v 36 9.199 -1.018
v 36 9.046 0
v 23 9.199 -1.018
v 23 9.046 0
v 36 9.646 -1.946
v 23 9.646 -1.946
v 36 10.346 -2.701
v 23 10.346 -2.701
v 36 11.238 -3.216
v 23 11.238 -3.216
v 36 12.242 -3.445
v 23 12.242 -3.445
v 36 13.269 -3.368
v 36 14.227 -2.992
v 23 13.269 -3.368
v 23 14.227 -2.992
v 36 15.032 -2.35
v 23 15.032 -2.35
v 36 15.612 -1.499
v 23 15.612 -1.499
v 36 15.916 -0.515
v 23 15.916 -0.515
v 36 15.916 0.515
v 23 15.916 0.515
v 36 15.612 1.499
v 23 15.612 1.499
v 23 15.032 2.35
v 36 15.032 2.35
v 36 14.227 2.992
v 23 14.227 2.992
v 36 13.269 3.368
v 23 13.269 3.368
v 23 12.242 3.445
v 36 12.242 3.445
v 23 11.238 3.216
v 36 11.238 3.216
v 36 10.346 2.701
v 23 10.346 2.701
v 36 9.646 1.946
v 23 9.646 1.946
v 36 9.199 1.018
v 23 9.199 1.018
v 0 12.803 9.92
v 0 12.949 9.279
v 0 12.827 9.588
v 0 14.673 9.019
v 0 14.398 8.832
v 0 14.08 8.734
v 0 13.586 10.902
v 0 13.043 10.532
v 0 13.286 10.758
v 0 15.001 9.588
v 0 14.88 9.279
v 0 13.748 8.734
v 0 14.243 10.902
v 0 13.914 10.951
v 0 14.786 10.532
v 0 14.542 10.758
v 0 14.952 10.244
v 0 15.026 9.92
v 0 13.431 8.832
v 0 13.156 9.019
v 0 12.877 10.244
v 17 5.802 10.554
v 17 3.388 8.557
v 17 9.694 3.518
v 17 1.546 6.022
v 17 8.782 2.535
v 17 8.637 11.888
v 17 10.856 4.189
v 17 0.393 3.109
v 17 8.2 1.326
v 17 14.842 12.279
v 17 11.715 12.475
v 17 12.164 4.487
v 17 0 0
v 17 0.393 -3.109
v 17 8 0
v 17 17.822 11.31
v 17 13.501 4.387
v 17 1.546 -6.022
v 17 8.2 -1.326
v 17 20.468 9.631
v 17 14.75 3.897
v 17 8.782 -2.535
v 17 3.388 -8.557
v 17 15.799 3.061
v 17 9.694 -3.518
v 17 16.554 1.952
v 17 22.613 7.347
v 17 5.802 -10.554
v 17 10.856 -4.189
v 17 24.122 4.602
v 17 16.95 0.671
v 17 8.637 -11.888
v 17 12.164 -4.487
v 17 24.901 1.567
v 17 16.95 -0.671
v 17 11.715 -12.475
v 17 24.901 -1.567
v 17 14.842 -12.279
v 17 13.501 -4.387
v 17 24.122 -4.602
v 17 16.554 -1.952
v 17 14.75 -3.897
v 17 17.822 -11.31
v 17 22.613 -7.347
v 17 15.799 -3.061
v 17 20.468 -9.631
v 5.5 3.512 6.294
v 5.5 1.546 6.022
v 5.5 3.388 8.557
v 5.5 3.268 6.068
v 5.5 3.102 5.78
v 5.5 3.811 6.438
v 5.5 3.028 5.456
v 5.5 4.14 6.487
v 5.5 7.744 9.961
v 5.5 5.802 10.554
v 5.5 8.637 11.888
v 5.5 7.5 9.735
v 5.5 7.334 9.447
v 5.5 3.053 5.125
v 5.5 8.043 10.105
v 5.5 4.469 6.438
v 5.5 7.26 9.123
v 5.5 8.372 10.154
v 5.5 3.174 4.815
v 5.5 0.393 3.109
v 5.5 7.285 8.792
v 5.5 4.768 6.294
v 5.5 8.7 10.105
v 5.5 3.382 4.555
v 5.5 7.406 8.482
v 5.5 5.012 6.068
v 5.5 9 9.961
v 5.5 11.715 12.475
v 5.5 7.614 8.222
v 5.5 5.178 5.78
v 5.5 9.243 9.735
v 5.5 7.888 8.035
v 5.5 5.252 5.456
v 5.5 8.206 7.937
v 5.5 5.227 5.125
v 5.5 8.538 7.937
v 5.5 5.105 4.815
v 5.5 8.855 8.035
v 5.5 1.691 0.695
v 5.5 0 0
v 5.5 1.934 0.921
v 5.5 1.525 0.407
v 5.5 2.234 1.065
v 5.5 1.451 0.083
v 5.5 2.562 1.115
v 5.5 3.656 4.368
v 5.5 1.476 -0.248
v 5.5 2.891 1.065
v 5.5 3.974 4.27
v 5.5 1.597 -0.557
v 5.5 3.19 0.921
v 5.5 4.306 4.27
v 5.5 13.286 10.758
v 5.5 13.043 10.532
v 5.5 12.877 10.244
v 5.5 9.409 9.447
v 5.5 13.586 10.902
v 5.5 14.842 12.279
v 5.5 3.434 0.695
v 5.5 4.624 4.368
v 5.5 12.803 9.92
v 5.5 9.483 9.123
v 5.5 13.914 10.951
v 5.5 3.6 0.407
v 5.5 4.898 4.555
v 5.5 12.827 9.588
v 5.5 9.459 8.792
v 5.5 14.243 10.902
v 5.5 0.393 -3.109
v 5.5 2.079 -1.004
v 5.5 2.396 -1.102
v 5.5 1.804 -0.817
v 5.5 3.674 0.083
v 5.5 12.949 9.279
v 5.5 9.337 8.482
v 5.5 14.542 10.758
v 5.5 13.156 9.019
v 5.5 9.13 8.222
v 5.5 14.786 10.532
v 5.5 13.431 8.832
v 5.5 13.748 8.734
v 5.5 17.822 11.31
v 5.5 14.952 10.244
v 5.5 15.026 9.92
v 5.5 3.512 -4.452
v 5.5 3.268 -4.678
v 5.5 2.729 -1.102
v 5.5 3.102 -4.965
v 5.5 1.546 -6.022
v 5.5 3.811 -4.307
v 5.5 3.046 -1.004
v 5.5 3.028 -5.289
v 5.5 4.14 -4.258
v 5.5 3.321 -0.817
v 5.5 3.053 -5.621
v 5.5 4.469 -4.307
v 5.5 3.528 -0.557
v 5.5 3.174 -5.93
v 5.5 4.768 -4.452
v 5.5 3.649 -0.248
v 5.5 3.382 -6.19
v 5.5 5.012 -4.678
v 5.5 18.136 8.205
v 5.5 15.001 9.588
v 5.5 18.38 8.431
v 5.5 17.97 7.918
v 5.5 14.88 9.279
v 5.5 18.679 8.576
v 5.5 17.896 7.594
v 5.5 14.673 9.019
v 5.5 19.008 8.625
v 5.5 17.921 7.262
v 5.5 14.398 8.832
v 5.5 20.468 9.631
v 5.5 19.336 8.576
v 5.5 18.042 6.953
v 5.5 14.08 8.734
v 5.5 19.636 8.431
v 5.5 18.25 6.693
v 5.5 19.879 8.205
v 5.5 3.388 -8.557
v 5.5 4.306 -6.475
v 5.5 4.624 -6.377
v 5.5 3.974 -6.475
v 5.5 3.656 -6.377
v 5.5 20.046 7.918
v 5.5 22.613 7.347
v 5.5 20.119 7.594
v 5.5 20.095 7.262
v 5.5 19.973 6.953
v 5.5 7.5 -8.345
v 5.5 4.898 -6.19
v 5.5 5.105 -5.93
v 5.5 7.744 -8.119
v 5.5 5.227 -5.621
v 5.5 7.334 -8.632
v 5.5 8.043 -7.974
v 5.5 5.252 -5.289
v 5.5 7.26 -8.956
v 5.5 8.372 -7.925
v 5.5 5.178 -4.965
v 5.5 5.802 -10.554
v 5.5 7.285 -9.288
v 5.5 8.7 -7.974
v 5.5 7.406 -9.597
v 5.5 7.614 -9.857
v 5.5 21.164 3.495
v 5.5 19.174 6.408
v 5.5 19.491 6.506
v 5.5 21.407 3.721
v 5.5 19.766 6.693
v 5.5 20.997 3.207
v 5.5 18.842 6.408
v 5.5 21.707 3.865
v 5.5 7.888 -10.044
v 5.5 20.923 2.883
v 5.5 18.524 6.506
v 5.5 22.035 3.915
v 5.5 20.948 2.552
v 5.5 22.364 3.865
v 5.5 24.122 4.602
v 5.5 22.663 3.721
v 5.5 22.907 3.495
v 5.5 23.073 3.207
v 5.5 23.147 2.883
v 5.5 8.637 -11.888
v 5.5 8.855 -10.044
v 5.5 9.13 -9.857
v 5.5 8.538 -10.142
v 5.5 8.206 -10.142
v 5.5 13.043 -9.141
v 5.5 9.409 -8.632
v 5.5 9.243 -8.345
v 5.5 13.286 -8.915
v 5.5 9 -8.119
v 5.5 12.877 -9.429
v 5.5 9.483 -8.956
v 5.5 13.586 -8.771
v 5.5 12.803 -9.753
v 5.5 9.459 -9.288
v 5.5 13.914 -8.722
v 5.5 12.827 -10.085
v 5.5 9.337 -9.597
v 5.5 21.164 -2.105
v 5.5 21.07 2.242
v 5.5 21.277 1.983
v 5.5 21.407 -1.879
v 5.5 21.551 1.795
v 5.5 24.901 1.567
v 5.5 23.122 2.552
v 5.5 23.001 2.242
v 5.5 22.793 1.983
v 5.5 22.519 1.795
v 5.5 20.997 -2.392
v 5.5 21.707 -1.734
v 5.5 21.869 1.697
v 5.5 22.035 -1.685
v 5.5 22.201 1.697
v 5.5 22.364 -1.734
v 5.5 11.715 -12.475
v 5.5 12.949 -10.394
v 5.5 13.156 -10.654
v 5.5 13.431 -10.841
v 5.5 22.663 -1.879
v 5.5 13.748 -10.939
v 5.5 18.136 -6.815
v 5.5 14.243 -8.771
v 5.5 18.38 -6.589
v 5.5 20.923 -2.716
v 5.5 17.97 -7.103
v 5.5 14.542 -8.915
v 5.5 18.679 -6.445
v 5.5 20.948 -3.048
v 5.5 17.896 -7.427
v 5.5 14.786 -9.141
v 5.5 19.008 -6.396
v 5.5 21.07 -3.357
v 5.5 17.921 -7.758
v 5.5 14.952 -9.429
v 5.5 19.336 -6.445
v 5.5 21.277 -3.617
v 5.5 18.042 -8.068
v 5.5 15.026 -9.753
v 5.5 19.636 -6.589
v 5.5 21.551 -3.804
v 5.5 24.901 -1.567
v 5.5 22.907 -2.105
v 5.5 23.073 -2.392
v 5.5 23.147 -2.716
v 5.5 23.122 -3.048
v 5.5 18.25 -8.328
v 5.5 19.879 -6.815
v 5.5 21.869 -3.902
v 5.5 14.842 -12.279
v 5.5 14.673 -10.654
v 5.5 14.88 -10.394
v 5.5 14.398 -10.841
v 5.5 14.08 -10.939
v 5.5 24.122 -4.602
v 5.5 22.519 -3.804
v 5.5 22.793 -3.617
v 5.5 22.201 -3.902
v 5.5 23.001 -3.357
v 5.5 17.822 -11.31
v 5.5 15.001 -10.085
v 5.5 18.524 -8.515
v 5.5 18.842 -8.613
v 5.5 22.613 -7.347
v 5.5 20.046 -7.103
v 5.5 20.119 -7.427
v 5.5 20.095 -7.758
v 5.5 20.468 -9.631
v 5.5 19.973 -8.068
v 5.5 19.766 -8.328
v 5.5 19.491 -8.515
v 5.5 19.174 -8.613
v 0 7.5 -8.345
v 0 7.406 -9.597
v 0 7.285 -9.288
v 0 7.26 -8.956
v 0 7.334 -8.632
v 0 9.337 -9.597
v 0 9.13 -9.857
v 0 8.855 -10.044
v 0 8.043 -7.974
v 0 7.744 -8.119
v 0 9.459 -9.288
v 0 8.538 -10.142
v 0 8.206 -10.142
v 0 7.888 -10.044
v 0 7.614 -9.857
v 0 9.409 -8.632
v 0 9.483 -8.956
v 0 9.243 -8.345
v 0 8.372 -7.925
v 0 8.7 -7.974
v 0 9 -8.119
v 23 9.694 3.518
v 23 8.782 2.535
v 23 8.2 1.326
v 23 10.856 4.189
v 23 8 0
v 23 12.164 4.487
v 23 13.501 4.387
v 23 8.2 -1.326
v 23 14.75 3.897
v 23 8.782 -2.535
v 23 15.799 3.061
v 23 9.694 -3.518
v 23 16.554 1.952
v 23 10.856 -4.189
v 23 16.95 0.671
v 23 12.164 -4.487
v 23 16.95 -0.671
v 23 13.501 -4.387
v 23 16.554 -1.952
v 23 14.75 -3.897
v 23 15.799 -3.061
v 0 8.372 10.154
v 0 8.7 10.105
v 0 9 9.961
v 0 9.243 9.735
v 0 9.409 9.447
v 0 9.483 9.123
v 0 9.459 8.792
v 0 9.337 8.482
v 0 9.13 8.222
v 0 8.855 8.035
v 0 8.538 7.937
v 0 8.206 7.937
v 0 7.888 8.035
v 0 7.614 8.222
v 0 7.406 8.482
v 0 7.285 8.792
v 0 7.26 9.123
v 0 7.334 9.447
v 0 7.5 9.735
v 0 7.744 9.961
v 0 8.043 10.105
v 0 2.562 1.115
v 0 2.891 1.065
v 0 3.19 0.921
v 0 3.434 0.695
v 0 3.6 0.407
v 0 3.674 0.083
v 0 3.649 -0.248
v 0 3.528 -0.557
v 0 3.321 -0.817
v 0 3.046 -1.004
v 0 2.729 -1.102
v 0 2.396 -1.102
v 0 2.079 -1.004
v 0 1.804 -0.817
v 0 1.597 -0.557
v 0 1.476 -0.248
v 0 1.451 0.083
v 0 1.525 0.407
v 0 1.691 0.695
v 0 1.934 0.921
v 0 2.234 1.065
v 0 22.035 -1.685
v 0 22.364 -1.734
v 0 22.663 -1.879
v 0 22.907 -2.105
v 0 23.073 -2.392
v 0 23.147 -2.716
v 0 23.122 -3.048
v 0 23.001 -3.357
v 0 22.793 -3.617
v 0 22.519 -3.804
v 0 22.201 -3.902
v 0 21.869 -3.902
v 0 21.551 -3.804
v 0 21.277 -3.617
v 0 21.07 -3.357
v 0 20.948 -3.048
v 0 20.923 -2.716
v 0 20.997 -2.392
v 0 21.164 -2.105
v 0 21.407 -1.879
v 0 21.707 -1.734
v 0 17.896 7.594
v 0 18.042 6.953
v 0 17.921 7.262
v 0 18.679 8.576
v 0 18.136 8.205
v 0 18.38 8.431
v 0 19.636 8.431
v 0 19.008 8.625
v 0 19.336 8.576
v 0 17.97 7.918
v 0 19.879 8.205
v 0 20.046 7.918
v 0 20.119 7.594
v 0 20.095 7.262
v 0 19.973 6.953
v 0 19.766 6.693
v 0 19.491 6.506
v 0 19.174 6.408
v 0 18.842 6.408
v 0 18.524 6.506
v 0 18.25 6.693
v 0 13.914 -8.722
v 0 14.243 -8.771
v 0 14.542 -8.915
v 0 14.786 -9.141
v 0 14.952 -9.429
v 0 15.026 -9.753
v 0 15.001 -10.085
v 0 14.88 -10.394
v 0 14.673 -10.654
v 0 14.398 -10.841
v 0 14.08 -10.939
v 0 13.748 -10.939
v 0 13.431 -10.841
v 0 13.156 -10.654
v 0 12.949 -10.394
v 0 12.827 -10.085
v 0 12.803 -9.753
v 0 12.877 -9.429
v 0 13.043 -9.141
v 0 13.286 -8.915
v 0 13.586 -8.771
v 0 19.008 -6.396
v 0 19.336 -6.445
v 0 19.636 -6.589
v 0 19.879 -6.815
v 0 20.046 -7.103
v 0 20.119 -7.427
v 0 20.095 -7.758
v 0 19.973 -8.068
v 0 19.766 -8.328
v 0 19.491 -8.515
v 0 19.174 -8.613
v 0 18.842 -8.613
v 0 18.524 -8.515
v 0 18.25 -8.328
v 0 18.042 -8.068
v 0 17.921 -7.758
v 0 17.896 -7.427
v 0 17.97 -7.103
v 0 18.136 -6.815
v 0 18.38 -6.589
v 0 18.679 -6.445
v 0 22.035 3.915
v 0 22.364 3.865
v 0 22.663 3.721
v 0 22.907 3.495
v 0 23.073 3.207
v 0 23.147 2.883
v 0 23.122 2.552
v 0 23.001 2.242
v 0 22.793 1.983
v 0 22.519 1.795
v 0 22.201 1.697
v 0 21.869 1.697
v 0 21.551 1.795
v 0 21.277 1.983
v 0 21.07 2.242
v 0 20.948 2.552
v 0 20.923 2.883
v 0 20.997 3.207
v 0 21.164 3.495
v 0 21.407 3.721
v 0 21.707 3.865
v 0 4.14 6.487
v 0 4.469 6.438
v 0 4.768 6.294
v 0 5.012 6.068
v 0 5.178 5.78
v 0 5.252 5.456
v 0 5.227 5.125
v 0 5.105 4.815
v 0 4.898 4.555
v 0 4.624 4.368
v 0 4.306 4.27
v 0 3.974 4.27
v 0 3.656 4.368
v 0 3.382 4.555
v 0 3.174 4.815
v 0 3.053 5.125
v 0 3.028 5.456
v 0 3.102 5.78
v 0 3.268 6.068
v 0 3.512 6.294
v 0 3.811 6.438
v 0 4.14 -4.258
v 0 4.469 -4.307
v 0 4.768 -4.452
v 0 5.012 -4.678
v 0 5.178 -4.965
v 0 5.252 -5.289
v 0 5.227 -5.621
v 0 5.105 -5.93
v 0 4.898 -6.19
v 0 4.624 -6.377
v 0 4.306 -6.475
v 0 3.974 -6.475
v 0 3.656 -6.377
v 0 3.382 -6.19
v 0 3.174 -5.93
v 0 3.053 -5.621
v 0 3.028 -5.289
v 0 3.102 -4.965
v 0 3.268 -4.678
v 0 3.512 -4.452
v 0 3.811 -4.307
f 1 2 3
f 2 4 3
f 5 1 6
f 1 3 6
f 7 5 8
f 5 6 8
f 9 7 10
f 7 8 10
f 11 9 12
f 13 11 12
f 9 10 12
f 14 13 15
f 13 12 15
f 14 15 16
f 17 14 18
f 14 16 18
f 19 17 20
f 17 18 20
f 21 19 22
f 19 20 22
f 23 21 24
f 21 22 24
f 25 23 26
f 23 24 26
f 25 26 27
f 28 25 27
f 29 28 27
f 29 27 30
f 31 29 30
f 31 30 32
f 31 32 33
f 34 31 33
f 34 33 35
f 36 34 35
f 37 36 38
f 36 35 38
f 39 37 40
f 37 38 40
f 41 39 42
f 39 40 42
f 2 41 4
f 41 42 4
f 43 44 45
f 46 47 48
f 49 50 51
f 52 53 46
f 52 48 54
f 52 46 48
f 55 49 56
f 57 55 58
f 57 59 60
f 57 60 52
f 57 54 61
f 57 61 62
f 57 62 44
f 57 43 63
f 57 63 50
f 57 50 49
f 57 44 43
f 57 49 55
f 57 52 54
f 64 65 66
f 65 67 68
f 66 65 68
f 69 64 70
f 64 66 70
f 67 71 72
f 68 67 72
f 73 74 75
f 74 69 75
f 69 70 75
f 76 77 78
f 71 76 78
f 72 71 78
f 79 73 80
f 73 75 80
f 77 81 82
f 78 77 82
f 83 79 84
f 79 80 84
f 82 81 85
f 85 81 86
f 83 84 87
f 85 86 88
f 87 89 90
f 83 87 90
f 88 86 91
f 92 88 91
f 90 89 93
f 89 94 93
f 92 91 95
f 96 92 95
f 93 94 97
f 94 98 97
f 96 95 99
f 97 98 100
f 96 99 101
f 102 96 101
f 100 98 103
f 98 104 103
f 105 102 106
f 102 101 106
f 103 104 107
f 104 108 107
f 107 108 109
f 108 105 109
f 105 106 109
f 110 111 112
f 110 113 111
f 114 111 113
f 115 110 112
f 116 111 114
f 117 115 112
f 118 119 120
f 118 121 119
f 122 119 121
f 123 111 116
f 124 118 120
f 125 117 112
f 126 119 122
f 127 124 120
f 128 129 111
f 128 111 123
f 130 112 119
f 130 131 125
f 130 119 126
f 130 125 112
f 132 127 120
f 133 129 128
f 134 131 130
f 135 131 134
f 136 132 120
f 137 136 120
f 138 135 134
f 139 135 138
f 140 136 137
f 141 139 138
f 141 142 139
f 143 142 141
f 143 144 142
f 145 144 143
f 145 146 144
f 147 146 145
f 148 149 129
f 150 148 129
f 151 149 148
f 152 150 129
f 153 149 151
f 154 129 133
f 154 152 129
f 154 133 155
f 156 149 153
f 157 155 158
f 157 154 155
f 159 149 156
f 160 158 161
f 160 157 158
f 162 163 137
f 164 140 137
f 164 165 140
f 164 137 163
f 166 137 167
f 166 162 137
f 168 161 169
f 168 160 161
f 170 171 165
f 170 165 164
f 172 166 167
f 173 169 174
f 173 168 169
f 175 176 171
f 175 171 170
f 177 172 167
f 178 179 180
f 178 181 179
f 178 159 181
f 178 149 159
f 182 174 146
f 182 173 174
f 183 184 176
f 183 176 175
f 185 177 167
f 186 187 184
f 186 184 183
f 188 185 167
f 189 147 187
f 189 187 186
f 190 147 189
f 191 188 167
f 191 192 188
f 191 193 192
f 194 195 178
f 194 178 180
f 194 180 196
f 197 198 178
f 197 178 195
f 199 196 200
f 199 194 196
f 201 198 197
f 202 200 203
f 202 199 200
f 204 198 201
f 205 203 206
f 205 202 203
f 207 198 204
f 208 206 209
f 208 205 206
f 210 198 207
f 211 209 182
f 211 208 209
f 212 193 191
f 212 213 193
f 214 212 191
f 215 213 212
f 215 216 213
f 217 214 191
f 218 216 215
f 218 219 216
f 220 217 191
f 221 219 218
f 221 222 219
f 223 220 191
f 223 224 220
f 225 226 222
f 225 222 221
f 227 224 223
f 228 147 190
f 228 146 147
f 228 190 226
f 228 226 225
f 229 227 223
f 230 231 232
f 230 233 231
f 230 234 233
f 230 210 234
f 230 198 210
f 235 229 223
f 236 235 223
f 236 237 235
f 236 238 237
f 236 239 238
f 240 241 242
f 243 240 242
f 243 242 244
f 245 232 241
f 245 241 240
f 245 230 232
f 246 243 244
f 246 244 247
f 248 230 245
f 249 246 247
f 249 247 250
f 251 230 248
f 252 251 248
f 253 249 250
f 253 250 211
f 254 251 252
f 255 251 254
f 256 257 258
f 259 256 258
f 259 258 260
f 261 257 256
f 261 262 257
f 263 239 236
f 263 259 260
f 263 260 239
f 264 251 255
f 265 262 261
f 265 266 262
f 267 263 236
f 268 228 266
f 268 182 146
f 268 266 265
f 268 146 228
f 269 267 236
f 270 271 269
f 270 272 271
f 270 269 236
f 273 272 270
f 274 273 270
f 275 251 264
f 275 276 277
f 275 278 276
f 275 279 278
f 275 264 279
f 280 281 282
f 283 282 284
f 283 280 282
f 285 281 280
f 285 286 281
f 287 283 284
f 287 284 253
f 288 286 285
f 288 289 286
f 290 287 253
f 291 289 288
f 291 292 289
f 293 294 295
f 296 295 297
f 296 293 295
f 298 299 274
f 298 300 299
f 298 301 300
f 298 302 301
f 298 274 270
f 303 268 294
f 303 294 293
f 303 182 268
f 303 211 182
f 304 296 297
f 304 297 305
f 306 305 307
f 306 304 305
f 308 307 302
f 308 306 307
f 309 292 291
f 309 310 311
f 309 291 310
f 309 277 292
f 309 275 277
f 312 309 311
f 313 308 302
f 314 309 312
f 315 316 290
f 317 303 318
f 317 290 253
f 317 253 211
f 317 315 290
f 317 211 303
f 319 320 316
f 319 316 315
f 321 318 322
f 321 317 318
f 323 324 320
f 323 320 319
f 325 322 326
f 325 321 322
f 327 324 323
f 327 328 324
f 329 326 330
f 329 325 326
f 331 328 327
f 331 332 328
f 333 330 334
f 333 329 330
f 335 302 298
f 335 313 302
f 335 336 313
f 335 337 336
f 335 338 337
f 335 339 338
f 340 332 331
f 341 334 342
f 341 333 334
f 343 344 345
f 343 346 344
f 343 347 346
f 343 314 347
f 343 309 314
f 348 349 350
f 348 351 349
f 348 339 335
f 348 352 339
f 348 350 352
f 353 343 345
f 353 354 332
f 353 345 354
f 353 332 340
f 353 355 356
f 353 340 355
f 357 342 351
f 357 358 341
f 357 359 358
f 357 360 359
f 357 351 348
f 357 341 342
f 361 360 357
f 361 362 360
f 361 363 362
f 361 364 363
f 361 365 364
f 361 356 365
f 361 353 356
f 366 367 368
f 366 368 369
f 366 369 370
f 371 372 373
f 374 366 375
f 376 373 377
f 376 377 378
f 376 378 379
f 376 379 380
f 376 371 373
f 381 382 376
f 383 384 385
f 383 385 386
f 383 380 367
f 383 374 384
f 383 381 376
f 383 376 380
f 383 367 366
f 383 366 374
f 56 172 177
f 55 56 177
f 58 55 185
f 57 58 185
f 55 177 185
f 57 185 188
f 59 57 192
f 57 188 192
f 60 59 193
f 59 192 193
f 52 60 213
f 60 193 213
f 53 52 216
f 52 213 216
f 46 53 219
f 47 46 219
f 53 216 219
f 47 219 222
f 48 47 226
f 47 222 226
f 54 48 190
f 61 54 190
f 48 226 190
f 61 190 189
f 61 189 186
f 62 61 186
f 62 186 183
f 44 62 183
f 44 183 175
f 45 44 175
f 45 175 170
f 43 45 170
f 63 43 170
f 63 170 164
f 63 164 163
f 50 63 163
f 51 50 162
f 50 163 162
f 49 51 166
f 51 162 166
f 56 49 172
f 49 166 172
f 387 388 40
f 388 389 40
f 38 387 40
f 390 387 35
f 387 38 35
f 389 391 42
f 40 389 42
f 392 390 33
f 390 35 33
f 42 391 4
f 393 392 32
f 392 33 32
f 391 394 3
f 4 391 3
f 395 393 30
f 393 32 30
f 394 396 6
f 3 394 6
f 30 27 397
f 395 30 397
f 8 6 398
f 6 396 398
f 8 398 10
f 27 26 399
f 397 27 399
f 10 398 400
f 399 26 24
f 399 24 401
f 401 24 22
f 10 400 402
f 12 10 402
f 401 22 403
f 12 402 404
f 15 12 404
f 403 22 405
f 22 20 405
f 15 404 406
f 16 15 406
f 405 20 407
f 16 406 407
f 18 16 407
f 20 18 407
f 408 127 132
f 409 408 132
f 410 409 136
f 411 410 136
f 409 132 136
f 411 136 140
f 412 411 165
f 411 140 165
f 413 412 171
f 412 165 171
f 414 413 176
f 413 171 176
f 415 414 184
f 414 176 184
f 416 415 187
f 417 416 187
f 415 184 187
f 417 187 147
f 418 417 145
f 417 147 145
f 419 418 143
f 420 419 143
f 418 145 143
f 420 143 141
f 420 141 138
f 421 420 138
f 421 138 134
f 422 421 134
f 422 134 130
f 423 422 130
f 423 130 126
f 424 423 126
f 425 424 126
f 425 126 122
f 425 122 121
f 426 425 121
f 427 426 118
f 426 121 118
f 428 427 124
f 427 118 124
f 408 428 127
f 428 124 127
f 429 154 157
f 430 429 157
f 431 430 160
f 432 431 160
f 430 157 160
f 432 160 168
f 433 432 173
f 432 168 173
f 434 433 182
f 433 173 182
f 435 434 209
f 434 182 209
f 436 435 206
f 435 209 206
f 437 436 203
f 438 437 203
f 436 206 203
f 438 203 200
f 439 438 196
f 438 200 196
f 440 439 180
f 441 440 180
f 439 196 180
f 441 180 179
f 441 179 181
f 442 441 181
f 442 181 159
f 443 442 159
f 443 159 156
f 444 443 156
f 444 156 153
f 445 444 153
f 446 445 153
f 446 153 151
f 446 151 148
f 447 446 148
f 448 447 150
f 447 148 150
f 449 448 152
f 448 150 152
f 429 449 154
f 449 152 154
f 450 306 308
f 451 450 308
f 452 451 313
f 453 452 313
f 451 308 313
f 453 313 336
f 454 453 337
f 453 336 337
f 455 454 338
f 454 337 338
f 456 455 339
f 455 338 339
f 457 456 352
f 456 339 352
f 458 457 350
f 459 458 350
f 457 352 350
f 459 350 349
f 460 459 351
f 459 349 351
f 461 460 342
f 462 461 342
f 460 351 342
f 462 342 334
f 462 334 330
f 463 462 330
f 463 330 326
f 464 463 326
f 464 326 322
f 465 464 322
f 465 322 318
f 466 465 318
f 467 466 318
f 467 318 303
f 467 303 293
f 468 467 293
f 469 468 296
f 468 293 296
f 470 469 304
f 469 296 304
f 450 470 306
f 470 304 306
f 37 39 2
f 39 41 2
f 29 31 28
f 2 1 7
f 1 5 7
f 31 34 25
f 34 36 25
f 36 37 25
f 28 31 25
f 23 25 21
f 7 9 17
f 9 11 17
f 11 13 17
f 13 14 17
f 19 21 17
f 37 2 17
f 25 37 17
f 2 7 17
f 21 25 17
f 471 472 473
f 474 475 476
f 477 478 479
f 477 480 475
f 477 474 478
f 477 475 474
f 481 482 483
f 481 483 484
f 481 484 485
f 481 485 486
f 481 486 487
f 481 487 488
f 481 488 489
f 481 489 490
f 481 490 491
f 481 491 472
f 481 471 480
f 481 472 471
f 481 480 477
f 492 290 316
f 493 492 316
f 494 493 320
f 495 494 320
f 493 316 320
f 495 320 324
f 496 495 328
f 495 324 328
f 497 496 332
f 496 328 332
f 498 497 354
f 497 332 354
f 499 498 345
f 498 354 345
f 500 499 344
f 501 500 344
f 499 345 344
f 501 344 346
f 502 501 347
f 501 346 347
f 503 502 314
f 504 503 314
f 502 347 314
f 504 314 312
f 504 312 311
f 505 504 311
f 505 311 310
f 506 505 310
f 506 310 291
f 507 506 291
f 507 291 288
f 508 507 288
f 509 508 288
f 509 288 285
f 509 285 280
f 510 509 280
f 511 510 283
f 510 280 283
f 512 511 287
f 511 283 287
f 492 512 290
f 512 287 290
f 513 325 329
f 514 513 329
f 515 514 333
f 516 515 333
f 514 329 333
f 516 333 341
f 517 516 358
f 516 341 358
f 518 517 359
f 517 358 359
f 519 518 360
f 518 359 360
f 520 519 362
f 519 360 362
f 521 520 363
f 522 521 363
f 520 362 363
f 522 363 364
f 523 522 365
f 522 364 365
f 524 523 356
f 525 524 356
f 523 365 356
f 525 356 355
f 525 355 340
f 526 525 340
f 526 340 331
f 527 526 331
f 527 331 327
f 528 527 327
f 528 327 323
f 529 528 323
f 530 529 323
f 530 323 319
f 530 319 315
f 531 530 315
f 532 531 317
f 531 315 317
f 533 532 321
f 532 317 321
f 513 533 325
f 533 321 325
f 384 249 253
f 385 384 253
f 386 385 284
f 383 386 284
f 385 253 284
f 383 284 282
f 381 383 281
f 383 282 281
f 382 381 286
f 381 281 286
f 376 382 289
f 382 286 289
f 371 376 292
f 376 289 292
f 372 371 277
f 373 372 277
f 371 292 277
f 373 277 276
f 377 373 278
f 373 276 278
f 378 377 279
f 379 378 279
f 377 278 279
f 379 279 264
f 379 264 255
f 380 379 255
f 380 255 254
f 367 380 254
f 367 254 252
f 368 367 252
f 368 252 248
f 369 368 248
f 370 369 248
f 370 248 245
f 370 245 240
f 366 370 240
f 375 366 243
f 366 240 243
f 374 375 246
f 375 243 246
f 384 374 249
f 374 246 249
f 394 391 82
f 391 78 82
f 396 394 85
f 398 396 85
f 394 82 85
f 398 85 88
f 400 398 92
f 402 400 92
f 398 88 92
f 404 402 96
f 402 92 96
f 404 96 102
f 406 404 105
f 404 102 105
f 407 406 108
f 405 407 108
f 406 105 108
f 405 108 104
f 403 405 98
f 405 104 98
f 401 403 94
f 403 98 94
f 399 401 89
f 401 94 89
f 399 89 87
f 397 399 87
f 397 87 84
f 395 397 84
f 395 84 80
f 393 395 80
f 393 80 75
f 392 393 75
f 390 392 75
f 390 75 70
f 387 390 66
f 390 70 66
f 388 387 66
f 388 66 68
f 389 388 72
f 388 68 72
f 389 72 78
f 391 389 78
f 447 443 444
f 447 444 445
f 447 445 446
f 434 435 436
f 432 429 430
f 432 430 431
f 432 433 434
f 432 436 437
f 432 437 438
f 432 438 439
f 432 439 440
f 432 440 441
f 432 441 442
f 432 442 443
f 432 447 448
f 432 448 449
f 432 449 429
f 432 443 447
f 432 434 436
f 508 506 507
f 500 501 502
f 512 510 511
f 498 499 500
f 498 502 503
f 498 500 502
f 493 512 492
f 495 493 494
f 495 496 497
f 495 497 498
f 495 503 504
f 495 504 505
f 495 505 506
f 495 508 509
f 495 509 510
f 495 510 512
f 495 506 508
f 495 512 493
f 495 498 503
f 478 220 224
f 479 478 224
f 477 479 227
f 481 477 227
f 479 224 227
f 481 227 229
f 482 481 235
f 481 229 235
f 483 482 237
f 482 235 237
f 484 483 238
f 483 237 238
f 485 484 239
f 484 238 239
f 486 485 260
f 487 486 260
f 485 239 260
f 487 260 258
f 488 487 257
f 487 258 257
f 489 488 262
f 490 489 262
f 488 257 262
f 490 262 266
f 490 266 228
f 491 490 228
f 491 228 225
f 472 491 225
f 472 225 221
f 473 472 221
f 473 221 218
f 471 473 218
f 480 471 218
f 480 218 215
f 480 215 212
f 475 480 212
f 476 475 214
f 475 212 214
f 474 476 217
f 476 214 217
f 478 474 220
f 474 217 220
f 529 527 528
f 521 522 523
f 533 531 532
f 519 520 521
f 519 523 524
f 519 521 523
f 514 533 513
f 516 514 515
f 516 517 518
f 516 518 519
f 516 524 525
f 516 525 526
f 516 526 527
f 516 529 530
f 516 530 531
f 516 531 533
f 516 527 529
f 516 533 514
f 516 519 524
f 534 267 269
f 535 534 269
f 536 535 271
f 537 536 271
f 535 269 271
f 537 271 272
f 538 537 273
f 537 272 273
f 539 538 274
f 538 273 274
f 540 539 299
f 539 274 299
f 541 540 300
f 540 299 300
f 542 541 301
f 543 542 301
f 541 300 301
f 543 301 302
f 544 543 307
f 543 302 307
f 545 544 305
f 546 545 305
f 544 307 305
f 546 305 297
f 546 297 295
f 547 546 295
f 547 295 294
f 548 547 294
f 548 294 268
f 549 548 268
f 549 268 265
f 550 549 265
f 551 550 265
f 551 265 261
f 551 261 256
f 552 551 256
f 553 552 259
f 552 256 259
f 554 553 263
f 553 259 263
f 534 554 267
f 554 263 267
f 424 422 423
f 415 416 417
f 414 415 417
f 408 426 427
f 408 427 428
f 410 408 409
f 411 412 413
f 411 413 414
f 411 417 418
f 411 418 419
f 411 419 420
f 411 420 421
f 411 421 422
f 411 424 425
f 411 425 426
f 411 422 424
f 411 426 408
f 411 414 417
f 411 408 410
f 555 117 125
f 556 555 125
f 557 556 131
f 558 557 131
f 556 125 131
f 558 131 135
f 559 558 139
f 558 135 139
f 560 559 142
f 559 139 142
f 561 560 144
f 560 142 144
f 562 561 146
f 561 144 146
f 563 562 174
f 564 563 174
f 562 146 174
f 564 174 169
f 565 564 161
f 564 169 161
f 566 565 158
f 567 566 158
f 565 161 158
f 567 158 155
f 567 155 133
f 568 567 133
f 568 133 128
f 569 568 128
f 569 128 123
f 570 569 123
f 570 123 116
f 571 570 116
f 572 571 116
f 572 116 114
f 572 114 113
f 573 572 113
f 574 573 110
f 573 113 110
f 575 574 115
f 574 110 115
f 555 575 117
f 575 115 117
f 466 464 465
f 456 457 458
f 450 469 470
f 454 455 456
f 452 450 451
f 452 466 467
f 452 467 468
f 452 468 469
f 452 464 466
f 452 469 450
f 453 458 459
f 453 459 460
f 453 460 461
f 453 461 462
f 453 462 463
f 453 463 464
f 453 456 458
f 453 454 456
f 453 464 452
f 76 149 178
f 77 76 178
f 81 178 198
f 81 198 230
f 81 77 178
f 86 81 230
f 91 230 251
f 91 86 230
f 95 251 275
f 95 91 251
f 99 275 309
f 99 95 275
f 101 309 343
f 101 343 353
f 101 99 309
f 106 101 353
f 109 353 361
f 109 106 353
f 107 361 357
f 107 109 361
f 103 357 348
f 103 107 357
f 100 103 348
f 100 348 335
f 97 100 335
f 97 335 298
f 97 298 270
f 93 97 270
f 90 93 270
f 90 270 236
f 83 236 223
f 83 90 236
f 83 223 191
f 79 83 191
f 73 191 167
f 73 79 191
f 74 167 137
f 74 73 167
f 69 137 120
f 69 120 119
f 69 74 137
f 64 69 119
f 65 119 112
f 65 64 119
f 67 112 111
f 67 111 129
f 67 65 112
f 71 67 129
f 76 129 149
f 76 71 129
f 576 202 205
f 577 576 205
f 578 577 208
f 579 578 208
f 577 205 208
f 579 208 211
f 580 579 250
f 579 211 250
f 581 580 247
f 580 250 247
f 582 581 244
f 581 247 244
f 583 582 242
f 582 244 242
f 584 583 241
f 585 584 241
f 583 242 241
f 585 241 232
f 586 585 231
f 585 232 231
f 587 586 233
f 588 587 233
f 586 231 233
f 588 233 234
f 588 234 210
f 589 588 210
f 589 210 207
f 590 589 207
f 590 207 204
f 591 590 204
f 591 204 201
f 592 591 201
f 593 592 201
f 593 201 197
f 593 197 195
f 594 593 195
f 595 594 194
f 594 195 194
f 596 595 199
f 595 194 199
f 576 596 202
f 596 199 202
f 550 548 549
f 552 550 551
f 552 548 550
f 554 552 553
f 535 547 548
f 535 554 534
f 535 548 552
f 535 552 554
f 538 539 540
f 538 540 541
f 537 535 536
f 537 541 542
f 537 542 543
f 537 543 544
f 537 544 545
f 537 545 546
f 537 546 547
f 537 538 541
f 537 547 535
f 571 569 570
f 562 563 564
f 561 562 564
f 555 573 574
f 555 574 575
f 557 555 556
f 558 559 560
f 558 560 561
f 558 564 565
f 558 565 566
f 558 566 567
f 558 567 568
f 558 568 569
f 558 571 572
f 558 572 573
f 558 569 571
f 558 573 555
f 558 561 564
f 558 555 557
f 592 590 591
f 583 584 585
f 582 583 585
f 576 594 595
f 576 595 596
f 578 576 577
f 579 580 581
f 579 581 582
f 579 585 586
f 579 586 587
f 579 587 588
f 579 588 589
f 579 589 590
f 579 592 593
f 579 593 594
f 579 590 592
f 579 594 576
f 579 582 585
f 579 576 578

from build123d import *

# Parameters (mm, degrees)
SZKIC3_R                    = 1.114790338
DODANIE_WYCI_GNI_CIE1_DEPTH = 5.5


with BuildPart() as part:
    # Szkic1 → Obrót2 (revolve)
    with BuildSketch(Plane.XY):
        Polygon((17, 0), (7, 0), (5.5, 0), (5.5, 2.829232786), (5.5, 4.829774456), (5.5, 7.237903332), (5.5, 9.045555295), (5.5, 11.058215628), (5.5, 12.5), (36, 12.5), (36, 9.045555295), (23, 9.045555295), (23, 8), (17, 8), align=None)
    revolve(axis=Axis((5.5, 12.5, 0), (1, 0, 0)))

    # Szkic3 → Dodanie-wyciągnięcie1 (add)
    with BuildSketch(Plane.ZY.offset(-5.5)):
        with Locations((-5.372694462, 4.139924233)):
            Circle(SZKIC3_R)
        with Locations((5.372694462, 4.139924233)):
            Circle(SZKIC3_R)
        with Locations((9.039596394, 8.371754652)):
            Circle(SZKIC3_R)
        with Locations((9.836490341, 13.9142738)):
            Circle(SZKIC3_R)
        with Locations((7.510368107, 19.00777101)):
            Circle(SZKIC3_R)
        with Locations((-2.799757064, 22.035096905)):
            Circle(SZKIC3_R)
        with Locations((-7.510368107, 19.00777101)):
            Circle(SZKIC3_R)
        with Locations((-9.836490341, 13.9142738)):
            Circle(SZKIC3_R)
        with Locations((-9.039596394, 8.371754652)):
            Circle(SZKIC3_R)
        with Locations((0, 2.5623588)):
            Circle(SZKIC3_R)
        with Locations((2.799757064, 22.035096905)):
            Circle(SZKIC3_R)
    extrude(amount=DODANIE_WYCI_GNI_CIE1_DEPTH)


solid = part.part
